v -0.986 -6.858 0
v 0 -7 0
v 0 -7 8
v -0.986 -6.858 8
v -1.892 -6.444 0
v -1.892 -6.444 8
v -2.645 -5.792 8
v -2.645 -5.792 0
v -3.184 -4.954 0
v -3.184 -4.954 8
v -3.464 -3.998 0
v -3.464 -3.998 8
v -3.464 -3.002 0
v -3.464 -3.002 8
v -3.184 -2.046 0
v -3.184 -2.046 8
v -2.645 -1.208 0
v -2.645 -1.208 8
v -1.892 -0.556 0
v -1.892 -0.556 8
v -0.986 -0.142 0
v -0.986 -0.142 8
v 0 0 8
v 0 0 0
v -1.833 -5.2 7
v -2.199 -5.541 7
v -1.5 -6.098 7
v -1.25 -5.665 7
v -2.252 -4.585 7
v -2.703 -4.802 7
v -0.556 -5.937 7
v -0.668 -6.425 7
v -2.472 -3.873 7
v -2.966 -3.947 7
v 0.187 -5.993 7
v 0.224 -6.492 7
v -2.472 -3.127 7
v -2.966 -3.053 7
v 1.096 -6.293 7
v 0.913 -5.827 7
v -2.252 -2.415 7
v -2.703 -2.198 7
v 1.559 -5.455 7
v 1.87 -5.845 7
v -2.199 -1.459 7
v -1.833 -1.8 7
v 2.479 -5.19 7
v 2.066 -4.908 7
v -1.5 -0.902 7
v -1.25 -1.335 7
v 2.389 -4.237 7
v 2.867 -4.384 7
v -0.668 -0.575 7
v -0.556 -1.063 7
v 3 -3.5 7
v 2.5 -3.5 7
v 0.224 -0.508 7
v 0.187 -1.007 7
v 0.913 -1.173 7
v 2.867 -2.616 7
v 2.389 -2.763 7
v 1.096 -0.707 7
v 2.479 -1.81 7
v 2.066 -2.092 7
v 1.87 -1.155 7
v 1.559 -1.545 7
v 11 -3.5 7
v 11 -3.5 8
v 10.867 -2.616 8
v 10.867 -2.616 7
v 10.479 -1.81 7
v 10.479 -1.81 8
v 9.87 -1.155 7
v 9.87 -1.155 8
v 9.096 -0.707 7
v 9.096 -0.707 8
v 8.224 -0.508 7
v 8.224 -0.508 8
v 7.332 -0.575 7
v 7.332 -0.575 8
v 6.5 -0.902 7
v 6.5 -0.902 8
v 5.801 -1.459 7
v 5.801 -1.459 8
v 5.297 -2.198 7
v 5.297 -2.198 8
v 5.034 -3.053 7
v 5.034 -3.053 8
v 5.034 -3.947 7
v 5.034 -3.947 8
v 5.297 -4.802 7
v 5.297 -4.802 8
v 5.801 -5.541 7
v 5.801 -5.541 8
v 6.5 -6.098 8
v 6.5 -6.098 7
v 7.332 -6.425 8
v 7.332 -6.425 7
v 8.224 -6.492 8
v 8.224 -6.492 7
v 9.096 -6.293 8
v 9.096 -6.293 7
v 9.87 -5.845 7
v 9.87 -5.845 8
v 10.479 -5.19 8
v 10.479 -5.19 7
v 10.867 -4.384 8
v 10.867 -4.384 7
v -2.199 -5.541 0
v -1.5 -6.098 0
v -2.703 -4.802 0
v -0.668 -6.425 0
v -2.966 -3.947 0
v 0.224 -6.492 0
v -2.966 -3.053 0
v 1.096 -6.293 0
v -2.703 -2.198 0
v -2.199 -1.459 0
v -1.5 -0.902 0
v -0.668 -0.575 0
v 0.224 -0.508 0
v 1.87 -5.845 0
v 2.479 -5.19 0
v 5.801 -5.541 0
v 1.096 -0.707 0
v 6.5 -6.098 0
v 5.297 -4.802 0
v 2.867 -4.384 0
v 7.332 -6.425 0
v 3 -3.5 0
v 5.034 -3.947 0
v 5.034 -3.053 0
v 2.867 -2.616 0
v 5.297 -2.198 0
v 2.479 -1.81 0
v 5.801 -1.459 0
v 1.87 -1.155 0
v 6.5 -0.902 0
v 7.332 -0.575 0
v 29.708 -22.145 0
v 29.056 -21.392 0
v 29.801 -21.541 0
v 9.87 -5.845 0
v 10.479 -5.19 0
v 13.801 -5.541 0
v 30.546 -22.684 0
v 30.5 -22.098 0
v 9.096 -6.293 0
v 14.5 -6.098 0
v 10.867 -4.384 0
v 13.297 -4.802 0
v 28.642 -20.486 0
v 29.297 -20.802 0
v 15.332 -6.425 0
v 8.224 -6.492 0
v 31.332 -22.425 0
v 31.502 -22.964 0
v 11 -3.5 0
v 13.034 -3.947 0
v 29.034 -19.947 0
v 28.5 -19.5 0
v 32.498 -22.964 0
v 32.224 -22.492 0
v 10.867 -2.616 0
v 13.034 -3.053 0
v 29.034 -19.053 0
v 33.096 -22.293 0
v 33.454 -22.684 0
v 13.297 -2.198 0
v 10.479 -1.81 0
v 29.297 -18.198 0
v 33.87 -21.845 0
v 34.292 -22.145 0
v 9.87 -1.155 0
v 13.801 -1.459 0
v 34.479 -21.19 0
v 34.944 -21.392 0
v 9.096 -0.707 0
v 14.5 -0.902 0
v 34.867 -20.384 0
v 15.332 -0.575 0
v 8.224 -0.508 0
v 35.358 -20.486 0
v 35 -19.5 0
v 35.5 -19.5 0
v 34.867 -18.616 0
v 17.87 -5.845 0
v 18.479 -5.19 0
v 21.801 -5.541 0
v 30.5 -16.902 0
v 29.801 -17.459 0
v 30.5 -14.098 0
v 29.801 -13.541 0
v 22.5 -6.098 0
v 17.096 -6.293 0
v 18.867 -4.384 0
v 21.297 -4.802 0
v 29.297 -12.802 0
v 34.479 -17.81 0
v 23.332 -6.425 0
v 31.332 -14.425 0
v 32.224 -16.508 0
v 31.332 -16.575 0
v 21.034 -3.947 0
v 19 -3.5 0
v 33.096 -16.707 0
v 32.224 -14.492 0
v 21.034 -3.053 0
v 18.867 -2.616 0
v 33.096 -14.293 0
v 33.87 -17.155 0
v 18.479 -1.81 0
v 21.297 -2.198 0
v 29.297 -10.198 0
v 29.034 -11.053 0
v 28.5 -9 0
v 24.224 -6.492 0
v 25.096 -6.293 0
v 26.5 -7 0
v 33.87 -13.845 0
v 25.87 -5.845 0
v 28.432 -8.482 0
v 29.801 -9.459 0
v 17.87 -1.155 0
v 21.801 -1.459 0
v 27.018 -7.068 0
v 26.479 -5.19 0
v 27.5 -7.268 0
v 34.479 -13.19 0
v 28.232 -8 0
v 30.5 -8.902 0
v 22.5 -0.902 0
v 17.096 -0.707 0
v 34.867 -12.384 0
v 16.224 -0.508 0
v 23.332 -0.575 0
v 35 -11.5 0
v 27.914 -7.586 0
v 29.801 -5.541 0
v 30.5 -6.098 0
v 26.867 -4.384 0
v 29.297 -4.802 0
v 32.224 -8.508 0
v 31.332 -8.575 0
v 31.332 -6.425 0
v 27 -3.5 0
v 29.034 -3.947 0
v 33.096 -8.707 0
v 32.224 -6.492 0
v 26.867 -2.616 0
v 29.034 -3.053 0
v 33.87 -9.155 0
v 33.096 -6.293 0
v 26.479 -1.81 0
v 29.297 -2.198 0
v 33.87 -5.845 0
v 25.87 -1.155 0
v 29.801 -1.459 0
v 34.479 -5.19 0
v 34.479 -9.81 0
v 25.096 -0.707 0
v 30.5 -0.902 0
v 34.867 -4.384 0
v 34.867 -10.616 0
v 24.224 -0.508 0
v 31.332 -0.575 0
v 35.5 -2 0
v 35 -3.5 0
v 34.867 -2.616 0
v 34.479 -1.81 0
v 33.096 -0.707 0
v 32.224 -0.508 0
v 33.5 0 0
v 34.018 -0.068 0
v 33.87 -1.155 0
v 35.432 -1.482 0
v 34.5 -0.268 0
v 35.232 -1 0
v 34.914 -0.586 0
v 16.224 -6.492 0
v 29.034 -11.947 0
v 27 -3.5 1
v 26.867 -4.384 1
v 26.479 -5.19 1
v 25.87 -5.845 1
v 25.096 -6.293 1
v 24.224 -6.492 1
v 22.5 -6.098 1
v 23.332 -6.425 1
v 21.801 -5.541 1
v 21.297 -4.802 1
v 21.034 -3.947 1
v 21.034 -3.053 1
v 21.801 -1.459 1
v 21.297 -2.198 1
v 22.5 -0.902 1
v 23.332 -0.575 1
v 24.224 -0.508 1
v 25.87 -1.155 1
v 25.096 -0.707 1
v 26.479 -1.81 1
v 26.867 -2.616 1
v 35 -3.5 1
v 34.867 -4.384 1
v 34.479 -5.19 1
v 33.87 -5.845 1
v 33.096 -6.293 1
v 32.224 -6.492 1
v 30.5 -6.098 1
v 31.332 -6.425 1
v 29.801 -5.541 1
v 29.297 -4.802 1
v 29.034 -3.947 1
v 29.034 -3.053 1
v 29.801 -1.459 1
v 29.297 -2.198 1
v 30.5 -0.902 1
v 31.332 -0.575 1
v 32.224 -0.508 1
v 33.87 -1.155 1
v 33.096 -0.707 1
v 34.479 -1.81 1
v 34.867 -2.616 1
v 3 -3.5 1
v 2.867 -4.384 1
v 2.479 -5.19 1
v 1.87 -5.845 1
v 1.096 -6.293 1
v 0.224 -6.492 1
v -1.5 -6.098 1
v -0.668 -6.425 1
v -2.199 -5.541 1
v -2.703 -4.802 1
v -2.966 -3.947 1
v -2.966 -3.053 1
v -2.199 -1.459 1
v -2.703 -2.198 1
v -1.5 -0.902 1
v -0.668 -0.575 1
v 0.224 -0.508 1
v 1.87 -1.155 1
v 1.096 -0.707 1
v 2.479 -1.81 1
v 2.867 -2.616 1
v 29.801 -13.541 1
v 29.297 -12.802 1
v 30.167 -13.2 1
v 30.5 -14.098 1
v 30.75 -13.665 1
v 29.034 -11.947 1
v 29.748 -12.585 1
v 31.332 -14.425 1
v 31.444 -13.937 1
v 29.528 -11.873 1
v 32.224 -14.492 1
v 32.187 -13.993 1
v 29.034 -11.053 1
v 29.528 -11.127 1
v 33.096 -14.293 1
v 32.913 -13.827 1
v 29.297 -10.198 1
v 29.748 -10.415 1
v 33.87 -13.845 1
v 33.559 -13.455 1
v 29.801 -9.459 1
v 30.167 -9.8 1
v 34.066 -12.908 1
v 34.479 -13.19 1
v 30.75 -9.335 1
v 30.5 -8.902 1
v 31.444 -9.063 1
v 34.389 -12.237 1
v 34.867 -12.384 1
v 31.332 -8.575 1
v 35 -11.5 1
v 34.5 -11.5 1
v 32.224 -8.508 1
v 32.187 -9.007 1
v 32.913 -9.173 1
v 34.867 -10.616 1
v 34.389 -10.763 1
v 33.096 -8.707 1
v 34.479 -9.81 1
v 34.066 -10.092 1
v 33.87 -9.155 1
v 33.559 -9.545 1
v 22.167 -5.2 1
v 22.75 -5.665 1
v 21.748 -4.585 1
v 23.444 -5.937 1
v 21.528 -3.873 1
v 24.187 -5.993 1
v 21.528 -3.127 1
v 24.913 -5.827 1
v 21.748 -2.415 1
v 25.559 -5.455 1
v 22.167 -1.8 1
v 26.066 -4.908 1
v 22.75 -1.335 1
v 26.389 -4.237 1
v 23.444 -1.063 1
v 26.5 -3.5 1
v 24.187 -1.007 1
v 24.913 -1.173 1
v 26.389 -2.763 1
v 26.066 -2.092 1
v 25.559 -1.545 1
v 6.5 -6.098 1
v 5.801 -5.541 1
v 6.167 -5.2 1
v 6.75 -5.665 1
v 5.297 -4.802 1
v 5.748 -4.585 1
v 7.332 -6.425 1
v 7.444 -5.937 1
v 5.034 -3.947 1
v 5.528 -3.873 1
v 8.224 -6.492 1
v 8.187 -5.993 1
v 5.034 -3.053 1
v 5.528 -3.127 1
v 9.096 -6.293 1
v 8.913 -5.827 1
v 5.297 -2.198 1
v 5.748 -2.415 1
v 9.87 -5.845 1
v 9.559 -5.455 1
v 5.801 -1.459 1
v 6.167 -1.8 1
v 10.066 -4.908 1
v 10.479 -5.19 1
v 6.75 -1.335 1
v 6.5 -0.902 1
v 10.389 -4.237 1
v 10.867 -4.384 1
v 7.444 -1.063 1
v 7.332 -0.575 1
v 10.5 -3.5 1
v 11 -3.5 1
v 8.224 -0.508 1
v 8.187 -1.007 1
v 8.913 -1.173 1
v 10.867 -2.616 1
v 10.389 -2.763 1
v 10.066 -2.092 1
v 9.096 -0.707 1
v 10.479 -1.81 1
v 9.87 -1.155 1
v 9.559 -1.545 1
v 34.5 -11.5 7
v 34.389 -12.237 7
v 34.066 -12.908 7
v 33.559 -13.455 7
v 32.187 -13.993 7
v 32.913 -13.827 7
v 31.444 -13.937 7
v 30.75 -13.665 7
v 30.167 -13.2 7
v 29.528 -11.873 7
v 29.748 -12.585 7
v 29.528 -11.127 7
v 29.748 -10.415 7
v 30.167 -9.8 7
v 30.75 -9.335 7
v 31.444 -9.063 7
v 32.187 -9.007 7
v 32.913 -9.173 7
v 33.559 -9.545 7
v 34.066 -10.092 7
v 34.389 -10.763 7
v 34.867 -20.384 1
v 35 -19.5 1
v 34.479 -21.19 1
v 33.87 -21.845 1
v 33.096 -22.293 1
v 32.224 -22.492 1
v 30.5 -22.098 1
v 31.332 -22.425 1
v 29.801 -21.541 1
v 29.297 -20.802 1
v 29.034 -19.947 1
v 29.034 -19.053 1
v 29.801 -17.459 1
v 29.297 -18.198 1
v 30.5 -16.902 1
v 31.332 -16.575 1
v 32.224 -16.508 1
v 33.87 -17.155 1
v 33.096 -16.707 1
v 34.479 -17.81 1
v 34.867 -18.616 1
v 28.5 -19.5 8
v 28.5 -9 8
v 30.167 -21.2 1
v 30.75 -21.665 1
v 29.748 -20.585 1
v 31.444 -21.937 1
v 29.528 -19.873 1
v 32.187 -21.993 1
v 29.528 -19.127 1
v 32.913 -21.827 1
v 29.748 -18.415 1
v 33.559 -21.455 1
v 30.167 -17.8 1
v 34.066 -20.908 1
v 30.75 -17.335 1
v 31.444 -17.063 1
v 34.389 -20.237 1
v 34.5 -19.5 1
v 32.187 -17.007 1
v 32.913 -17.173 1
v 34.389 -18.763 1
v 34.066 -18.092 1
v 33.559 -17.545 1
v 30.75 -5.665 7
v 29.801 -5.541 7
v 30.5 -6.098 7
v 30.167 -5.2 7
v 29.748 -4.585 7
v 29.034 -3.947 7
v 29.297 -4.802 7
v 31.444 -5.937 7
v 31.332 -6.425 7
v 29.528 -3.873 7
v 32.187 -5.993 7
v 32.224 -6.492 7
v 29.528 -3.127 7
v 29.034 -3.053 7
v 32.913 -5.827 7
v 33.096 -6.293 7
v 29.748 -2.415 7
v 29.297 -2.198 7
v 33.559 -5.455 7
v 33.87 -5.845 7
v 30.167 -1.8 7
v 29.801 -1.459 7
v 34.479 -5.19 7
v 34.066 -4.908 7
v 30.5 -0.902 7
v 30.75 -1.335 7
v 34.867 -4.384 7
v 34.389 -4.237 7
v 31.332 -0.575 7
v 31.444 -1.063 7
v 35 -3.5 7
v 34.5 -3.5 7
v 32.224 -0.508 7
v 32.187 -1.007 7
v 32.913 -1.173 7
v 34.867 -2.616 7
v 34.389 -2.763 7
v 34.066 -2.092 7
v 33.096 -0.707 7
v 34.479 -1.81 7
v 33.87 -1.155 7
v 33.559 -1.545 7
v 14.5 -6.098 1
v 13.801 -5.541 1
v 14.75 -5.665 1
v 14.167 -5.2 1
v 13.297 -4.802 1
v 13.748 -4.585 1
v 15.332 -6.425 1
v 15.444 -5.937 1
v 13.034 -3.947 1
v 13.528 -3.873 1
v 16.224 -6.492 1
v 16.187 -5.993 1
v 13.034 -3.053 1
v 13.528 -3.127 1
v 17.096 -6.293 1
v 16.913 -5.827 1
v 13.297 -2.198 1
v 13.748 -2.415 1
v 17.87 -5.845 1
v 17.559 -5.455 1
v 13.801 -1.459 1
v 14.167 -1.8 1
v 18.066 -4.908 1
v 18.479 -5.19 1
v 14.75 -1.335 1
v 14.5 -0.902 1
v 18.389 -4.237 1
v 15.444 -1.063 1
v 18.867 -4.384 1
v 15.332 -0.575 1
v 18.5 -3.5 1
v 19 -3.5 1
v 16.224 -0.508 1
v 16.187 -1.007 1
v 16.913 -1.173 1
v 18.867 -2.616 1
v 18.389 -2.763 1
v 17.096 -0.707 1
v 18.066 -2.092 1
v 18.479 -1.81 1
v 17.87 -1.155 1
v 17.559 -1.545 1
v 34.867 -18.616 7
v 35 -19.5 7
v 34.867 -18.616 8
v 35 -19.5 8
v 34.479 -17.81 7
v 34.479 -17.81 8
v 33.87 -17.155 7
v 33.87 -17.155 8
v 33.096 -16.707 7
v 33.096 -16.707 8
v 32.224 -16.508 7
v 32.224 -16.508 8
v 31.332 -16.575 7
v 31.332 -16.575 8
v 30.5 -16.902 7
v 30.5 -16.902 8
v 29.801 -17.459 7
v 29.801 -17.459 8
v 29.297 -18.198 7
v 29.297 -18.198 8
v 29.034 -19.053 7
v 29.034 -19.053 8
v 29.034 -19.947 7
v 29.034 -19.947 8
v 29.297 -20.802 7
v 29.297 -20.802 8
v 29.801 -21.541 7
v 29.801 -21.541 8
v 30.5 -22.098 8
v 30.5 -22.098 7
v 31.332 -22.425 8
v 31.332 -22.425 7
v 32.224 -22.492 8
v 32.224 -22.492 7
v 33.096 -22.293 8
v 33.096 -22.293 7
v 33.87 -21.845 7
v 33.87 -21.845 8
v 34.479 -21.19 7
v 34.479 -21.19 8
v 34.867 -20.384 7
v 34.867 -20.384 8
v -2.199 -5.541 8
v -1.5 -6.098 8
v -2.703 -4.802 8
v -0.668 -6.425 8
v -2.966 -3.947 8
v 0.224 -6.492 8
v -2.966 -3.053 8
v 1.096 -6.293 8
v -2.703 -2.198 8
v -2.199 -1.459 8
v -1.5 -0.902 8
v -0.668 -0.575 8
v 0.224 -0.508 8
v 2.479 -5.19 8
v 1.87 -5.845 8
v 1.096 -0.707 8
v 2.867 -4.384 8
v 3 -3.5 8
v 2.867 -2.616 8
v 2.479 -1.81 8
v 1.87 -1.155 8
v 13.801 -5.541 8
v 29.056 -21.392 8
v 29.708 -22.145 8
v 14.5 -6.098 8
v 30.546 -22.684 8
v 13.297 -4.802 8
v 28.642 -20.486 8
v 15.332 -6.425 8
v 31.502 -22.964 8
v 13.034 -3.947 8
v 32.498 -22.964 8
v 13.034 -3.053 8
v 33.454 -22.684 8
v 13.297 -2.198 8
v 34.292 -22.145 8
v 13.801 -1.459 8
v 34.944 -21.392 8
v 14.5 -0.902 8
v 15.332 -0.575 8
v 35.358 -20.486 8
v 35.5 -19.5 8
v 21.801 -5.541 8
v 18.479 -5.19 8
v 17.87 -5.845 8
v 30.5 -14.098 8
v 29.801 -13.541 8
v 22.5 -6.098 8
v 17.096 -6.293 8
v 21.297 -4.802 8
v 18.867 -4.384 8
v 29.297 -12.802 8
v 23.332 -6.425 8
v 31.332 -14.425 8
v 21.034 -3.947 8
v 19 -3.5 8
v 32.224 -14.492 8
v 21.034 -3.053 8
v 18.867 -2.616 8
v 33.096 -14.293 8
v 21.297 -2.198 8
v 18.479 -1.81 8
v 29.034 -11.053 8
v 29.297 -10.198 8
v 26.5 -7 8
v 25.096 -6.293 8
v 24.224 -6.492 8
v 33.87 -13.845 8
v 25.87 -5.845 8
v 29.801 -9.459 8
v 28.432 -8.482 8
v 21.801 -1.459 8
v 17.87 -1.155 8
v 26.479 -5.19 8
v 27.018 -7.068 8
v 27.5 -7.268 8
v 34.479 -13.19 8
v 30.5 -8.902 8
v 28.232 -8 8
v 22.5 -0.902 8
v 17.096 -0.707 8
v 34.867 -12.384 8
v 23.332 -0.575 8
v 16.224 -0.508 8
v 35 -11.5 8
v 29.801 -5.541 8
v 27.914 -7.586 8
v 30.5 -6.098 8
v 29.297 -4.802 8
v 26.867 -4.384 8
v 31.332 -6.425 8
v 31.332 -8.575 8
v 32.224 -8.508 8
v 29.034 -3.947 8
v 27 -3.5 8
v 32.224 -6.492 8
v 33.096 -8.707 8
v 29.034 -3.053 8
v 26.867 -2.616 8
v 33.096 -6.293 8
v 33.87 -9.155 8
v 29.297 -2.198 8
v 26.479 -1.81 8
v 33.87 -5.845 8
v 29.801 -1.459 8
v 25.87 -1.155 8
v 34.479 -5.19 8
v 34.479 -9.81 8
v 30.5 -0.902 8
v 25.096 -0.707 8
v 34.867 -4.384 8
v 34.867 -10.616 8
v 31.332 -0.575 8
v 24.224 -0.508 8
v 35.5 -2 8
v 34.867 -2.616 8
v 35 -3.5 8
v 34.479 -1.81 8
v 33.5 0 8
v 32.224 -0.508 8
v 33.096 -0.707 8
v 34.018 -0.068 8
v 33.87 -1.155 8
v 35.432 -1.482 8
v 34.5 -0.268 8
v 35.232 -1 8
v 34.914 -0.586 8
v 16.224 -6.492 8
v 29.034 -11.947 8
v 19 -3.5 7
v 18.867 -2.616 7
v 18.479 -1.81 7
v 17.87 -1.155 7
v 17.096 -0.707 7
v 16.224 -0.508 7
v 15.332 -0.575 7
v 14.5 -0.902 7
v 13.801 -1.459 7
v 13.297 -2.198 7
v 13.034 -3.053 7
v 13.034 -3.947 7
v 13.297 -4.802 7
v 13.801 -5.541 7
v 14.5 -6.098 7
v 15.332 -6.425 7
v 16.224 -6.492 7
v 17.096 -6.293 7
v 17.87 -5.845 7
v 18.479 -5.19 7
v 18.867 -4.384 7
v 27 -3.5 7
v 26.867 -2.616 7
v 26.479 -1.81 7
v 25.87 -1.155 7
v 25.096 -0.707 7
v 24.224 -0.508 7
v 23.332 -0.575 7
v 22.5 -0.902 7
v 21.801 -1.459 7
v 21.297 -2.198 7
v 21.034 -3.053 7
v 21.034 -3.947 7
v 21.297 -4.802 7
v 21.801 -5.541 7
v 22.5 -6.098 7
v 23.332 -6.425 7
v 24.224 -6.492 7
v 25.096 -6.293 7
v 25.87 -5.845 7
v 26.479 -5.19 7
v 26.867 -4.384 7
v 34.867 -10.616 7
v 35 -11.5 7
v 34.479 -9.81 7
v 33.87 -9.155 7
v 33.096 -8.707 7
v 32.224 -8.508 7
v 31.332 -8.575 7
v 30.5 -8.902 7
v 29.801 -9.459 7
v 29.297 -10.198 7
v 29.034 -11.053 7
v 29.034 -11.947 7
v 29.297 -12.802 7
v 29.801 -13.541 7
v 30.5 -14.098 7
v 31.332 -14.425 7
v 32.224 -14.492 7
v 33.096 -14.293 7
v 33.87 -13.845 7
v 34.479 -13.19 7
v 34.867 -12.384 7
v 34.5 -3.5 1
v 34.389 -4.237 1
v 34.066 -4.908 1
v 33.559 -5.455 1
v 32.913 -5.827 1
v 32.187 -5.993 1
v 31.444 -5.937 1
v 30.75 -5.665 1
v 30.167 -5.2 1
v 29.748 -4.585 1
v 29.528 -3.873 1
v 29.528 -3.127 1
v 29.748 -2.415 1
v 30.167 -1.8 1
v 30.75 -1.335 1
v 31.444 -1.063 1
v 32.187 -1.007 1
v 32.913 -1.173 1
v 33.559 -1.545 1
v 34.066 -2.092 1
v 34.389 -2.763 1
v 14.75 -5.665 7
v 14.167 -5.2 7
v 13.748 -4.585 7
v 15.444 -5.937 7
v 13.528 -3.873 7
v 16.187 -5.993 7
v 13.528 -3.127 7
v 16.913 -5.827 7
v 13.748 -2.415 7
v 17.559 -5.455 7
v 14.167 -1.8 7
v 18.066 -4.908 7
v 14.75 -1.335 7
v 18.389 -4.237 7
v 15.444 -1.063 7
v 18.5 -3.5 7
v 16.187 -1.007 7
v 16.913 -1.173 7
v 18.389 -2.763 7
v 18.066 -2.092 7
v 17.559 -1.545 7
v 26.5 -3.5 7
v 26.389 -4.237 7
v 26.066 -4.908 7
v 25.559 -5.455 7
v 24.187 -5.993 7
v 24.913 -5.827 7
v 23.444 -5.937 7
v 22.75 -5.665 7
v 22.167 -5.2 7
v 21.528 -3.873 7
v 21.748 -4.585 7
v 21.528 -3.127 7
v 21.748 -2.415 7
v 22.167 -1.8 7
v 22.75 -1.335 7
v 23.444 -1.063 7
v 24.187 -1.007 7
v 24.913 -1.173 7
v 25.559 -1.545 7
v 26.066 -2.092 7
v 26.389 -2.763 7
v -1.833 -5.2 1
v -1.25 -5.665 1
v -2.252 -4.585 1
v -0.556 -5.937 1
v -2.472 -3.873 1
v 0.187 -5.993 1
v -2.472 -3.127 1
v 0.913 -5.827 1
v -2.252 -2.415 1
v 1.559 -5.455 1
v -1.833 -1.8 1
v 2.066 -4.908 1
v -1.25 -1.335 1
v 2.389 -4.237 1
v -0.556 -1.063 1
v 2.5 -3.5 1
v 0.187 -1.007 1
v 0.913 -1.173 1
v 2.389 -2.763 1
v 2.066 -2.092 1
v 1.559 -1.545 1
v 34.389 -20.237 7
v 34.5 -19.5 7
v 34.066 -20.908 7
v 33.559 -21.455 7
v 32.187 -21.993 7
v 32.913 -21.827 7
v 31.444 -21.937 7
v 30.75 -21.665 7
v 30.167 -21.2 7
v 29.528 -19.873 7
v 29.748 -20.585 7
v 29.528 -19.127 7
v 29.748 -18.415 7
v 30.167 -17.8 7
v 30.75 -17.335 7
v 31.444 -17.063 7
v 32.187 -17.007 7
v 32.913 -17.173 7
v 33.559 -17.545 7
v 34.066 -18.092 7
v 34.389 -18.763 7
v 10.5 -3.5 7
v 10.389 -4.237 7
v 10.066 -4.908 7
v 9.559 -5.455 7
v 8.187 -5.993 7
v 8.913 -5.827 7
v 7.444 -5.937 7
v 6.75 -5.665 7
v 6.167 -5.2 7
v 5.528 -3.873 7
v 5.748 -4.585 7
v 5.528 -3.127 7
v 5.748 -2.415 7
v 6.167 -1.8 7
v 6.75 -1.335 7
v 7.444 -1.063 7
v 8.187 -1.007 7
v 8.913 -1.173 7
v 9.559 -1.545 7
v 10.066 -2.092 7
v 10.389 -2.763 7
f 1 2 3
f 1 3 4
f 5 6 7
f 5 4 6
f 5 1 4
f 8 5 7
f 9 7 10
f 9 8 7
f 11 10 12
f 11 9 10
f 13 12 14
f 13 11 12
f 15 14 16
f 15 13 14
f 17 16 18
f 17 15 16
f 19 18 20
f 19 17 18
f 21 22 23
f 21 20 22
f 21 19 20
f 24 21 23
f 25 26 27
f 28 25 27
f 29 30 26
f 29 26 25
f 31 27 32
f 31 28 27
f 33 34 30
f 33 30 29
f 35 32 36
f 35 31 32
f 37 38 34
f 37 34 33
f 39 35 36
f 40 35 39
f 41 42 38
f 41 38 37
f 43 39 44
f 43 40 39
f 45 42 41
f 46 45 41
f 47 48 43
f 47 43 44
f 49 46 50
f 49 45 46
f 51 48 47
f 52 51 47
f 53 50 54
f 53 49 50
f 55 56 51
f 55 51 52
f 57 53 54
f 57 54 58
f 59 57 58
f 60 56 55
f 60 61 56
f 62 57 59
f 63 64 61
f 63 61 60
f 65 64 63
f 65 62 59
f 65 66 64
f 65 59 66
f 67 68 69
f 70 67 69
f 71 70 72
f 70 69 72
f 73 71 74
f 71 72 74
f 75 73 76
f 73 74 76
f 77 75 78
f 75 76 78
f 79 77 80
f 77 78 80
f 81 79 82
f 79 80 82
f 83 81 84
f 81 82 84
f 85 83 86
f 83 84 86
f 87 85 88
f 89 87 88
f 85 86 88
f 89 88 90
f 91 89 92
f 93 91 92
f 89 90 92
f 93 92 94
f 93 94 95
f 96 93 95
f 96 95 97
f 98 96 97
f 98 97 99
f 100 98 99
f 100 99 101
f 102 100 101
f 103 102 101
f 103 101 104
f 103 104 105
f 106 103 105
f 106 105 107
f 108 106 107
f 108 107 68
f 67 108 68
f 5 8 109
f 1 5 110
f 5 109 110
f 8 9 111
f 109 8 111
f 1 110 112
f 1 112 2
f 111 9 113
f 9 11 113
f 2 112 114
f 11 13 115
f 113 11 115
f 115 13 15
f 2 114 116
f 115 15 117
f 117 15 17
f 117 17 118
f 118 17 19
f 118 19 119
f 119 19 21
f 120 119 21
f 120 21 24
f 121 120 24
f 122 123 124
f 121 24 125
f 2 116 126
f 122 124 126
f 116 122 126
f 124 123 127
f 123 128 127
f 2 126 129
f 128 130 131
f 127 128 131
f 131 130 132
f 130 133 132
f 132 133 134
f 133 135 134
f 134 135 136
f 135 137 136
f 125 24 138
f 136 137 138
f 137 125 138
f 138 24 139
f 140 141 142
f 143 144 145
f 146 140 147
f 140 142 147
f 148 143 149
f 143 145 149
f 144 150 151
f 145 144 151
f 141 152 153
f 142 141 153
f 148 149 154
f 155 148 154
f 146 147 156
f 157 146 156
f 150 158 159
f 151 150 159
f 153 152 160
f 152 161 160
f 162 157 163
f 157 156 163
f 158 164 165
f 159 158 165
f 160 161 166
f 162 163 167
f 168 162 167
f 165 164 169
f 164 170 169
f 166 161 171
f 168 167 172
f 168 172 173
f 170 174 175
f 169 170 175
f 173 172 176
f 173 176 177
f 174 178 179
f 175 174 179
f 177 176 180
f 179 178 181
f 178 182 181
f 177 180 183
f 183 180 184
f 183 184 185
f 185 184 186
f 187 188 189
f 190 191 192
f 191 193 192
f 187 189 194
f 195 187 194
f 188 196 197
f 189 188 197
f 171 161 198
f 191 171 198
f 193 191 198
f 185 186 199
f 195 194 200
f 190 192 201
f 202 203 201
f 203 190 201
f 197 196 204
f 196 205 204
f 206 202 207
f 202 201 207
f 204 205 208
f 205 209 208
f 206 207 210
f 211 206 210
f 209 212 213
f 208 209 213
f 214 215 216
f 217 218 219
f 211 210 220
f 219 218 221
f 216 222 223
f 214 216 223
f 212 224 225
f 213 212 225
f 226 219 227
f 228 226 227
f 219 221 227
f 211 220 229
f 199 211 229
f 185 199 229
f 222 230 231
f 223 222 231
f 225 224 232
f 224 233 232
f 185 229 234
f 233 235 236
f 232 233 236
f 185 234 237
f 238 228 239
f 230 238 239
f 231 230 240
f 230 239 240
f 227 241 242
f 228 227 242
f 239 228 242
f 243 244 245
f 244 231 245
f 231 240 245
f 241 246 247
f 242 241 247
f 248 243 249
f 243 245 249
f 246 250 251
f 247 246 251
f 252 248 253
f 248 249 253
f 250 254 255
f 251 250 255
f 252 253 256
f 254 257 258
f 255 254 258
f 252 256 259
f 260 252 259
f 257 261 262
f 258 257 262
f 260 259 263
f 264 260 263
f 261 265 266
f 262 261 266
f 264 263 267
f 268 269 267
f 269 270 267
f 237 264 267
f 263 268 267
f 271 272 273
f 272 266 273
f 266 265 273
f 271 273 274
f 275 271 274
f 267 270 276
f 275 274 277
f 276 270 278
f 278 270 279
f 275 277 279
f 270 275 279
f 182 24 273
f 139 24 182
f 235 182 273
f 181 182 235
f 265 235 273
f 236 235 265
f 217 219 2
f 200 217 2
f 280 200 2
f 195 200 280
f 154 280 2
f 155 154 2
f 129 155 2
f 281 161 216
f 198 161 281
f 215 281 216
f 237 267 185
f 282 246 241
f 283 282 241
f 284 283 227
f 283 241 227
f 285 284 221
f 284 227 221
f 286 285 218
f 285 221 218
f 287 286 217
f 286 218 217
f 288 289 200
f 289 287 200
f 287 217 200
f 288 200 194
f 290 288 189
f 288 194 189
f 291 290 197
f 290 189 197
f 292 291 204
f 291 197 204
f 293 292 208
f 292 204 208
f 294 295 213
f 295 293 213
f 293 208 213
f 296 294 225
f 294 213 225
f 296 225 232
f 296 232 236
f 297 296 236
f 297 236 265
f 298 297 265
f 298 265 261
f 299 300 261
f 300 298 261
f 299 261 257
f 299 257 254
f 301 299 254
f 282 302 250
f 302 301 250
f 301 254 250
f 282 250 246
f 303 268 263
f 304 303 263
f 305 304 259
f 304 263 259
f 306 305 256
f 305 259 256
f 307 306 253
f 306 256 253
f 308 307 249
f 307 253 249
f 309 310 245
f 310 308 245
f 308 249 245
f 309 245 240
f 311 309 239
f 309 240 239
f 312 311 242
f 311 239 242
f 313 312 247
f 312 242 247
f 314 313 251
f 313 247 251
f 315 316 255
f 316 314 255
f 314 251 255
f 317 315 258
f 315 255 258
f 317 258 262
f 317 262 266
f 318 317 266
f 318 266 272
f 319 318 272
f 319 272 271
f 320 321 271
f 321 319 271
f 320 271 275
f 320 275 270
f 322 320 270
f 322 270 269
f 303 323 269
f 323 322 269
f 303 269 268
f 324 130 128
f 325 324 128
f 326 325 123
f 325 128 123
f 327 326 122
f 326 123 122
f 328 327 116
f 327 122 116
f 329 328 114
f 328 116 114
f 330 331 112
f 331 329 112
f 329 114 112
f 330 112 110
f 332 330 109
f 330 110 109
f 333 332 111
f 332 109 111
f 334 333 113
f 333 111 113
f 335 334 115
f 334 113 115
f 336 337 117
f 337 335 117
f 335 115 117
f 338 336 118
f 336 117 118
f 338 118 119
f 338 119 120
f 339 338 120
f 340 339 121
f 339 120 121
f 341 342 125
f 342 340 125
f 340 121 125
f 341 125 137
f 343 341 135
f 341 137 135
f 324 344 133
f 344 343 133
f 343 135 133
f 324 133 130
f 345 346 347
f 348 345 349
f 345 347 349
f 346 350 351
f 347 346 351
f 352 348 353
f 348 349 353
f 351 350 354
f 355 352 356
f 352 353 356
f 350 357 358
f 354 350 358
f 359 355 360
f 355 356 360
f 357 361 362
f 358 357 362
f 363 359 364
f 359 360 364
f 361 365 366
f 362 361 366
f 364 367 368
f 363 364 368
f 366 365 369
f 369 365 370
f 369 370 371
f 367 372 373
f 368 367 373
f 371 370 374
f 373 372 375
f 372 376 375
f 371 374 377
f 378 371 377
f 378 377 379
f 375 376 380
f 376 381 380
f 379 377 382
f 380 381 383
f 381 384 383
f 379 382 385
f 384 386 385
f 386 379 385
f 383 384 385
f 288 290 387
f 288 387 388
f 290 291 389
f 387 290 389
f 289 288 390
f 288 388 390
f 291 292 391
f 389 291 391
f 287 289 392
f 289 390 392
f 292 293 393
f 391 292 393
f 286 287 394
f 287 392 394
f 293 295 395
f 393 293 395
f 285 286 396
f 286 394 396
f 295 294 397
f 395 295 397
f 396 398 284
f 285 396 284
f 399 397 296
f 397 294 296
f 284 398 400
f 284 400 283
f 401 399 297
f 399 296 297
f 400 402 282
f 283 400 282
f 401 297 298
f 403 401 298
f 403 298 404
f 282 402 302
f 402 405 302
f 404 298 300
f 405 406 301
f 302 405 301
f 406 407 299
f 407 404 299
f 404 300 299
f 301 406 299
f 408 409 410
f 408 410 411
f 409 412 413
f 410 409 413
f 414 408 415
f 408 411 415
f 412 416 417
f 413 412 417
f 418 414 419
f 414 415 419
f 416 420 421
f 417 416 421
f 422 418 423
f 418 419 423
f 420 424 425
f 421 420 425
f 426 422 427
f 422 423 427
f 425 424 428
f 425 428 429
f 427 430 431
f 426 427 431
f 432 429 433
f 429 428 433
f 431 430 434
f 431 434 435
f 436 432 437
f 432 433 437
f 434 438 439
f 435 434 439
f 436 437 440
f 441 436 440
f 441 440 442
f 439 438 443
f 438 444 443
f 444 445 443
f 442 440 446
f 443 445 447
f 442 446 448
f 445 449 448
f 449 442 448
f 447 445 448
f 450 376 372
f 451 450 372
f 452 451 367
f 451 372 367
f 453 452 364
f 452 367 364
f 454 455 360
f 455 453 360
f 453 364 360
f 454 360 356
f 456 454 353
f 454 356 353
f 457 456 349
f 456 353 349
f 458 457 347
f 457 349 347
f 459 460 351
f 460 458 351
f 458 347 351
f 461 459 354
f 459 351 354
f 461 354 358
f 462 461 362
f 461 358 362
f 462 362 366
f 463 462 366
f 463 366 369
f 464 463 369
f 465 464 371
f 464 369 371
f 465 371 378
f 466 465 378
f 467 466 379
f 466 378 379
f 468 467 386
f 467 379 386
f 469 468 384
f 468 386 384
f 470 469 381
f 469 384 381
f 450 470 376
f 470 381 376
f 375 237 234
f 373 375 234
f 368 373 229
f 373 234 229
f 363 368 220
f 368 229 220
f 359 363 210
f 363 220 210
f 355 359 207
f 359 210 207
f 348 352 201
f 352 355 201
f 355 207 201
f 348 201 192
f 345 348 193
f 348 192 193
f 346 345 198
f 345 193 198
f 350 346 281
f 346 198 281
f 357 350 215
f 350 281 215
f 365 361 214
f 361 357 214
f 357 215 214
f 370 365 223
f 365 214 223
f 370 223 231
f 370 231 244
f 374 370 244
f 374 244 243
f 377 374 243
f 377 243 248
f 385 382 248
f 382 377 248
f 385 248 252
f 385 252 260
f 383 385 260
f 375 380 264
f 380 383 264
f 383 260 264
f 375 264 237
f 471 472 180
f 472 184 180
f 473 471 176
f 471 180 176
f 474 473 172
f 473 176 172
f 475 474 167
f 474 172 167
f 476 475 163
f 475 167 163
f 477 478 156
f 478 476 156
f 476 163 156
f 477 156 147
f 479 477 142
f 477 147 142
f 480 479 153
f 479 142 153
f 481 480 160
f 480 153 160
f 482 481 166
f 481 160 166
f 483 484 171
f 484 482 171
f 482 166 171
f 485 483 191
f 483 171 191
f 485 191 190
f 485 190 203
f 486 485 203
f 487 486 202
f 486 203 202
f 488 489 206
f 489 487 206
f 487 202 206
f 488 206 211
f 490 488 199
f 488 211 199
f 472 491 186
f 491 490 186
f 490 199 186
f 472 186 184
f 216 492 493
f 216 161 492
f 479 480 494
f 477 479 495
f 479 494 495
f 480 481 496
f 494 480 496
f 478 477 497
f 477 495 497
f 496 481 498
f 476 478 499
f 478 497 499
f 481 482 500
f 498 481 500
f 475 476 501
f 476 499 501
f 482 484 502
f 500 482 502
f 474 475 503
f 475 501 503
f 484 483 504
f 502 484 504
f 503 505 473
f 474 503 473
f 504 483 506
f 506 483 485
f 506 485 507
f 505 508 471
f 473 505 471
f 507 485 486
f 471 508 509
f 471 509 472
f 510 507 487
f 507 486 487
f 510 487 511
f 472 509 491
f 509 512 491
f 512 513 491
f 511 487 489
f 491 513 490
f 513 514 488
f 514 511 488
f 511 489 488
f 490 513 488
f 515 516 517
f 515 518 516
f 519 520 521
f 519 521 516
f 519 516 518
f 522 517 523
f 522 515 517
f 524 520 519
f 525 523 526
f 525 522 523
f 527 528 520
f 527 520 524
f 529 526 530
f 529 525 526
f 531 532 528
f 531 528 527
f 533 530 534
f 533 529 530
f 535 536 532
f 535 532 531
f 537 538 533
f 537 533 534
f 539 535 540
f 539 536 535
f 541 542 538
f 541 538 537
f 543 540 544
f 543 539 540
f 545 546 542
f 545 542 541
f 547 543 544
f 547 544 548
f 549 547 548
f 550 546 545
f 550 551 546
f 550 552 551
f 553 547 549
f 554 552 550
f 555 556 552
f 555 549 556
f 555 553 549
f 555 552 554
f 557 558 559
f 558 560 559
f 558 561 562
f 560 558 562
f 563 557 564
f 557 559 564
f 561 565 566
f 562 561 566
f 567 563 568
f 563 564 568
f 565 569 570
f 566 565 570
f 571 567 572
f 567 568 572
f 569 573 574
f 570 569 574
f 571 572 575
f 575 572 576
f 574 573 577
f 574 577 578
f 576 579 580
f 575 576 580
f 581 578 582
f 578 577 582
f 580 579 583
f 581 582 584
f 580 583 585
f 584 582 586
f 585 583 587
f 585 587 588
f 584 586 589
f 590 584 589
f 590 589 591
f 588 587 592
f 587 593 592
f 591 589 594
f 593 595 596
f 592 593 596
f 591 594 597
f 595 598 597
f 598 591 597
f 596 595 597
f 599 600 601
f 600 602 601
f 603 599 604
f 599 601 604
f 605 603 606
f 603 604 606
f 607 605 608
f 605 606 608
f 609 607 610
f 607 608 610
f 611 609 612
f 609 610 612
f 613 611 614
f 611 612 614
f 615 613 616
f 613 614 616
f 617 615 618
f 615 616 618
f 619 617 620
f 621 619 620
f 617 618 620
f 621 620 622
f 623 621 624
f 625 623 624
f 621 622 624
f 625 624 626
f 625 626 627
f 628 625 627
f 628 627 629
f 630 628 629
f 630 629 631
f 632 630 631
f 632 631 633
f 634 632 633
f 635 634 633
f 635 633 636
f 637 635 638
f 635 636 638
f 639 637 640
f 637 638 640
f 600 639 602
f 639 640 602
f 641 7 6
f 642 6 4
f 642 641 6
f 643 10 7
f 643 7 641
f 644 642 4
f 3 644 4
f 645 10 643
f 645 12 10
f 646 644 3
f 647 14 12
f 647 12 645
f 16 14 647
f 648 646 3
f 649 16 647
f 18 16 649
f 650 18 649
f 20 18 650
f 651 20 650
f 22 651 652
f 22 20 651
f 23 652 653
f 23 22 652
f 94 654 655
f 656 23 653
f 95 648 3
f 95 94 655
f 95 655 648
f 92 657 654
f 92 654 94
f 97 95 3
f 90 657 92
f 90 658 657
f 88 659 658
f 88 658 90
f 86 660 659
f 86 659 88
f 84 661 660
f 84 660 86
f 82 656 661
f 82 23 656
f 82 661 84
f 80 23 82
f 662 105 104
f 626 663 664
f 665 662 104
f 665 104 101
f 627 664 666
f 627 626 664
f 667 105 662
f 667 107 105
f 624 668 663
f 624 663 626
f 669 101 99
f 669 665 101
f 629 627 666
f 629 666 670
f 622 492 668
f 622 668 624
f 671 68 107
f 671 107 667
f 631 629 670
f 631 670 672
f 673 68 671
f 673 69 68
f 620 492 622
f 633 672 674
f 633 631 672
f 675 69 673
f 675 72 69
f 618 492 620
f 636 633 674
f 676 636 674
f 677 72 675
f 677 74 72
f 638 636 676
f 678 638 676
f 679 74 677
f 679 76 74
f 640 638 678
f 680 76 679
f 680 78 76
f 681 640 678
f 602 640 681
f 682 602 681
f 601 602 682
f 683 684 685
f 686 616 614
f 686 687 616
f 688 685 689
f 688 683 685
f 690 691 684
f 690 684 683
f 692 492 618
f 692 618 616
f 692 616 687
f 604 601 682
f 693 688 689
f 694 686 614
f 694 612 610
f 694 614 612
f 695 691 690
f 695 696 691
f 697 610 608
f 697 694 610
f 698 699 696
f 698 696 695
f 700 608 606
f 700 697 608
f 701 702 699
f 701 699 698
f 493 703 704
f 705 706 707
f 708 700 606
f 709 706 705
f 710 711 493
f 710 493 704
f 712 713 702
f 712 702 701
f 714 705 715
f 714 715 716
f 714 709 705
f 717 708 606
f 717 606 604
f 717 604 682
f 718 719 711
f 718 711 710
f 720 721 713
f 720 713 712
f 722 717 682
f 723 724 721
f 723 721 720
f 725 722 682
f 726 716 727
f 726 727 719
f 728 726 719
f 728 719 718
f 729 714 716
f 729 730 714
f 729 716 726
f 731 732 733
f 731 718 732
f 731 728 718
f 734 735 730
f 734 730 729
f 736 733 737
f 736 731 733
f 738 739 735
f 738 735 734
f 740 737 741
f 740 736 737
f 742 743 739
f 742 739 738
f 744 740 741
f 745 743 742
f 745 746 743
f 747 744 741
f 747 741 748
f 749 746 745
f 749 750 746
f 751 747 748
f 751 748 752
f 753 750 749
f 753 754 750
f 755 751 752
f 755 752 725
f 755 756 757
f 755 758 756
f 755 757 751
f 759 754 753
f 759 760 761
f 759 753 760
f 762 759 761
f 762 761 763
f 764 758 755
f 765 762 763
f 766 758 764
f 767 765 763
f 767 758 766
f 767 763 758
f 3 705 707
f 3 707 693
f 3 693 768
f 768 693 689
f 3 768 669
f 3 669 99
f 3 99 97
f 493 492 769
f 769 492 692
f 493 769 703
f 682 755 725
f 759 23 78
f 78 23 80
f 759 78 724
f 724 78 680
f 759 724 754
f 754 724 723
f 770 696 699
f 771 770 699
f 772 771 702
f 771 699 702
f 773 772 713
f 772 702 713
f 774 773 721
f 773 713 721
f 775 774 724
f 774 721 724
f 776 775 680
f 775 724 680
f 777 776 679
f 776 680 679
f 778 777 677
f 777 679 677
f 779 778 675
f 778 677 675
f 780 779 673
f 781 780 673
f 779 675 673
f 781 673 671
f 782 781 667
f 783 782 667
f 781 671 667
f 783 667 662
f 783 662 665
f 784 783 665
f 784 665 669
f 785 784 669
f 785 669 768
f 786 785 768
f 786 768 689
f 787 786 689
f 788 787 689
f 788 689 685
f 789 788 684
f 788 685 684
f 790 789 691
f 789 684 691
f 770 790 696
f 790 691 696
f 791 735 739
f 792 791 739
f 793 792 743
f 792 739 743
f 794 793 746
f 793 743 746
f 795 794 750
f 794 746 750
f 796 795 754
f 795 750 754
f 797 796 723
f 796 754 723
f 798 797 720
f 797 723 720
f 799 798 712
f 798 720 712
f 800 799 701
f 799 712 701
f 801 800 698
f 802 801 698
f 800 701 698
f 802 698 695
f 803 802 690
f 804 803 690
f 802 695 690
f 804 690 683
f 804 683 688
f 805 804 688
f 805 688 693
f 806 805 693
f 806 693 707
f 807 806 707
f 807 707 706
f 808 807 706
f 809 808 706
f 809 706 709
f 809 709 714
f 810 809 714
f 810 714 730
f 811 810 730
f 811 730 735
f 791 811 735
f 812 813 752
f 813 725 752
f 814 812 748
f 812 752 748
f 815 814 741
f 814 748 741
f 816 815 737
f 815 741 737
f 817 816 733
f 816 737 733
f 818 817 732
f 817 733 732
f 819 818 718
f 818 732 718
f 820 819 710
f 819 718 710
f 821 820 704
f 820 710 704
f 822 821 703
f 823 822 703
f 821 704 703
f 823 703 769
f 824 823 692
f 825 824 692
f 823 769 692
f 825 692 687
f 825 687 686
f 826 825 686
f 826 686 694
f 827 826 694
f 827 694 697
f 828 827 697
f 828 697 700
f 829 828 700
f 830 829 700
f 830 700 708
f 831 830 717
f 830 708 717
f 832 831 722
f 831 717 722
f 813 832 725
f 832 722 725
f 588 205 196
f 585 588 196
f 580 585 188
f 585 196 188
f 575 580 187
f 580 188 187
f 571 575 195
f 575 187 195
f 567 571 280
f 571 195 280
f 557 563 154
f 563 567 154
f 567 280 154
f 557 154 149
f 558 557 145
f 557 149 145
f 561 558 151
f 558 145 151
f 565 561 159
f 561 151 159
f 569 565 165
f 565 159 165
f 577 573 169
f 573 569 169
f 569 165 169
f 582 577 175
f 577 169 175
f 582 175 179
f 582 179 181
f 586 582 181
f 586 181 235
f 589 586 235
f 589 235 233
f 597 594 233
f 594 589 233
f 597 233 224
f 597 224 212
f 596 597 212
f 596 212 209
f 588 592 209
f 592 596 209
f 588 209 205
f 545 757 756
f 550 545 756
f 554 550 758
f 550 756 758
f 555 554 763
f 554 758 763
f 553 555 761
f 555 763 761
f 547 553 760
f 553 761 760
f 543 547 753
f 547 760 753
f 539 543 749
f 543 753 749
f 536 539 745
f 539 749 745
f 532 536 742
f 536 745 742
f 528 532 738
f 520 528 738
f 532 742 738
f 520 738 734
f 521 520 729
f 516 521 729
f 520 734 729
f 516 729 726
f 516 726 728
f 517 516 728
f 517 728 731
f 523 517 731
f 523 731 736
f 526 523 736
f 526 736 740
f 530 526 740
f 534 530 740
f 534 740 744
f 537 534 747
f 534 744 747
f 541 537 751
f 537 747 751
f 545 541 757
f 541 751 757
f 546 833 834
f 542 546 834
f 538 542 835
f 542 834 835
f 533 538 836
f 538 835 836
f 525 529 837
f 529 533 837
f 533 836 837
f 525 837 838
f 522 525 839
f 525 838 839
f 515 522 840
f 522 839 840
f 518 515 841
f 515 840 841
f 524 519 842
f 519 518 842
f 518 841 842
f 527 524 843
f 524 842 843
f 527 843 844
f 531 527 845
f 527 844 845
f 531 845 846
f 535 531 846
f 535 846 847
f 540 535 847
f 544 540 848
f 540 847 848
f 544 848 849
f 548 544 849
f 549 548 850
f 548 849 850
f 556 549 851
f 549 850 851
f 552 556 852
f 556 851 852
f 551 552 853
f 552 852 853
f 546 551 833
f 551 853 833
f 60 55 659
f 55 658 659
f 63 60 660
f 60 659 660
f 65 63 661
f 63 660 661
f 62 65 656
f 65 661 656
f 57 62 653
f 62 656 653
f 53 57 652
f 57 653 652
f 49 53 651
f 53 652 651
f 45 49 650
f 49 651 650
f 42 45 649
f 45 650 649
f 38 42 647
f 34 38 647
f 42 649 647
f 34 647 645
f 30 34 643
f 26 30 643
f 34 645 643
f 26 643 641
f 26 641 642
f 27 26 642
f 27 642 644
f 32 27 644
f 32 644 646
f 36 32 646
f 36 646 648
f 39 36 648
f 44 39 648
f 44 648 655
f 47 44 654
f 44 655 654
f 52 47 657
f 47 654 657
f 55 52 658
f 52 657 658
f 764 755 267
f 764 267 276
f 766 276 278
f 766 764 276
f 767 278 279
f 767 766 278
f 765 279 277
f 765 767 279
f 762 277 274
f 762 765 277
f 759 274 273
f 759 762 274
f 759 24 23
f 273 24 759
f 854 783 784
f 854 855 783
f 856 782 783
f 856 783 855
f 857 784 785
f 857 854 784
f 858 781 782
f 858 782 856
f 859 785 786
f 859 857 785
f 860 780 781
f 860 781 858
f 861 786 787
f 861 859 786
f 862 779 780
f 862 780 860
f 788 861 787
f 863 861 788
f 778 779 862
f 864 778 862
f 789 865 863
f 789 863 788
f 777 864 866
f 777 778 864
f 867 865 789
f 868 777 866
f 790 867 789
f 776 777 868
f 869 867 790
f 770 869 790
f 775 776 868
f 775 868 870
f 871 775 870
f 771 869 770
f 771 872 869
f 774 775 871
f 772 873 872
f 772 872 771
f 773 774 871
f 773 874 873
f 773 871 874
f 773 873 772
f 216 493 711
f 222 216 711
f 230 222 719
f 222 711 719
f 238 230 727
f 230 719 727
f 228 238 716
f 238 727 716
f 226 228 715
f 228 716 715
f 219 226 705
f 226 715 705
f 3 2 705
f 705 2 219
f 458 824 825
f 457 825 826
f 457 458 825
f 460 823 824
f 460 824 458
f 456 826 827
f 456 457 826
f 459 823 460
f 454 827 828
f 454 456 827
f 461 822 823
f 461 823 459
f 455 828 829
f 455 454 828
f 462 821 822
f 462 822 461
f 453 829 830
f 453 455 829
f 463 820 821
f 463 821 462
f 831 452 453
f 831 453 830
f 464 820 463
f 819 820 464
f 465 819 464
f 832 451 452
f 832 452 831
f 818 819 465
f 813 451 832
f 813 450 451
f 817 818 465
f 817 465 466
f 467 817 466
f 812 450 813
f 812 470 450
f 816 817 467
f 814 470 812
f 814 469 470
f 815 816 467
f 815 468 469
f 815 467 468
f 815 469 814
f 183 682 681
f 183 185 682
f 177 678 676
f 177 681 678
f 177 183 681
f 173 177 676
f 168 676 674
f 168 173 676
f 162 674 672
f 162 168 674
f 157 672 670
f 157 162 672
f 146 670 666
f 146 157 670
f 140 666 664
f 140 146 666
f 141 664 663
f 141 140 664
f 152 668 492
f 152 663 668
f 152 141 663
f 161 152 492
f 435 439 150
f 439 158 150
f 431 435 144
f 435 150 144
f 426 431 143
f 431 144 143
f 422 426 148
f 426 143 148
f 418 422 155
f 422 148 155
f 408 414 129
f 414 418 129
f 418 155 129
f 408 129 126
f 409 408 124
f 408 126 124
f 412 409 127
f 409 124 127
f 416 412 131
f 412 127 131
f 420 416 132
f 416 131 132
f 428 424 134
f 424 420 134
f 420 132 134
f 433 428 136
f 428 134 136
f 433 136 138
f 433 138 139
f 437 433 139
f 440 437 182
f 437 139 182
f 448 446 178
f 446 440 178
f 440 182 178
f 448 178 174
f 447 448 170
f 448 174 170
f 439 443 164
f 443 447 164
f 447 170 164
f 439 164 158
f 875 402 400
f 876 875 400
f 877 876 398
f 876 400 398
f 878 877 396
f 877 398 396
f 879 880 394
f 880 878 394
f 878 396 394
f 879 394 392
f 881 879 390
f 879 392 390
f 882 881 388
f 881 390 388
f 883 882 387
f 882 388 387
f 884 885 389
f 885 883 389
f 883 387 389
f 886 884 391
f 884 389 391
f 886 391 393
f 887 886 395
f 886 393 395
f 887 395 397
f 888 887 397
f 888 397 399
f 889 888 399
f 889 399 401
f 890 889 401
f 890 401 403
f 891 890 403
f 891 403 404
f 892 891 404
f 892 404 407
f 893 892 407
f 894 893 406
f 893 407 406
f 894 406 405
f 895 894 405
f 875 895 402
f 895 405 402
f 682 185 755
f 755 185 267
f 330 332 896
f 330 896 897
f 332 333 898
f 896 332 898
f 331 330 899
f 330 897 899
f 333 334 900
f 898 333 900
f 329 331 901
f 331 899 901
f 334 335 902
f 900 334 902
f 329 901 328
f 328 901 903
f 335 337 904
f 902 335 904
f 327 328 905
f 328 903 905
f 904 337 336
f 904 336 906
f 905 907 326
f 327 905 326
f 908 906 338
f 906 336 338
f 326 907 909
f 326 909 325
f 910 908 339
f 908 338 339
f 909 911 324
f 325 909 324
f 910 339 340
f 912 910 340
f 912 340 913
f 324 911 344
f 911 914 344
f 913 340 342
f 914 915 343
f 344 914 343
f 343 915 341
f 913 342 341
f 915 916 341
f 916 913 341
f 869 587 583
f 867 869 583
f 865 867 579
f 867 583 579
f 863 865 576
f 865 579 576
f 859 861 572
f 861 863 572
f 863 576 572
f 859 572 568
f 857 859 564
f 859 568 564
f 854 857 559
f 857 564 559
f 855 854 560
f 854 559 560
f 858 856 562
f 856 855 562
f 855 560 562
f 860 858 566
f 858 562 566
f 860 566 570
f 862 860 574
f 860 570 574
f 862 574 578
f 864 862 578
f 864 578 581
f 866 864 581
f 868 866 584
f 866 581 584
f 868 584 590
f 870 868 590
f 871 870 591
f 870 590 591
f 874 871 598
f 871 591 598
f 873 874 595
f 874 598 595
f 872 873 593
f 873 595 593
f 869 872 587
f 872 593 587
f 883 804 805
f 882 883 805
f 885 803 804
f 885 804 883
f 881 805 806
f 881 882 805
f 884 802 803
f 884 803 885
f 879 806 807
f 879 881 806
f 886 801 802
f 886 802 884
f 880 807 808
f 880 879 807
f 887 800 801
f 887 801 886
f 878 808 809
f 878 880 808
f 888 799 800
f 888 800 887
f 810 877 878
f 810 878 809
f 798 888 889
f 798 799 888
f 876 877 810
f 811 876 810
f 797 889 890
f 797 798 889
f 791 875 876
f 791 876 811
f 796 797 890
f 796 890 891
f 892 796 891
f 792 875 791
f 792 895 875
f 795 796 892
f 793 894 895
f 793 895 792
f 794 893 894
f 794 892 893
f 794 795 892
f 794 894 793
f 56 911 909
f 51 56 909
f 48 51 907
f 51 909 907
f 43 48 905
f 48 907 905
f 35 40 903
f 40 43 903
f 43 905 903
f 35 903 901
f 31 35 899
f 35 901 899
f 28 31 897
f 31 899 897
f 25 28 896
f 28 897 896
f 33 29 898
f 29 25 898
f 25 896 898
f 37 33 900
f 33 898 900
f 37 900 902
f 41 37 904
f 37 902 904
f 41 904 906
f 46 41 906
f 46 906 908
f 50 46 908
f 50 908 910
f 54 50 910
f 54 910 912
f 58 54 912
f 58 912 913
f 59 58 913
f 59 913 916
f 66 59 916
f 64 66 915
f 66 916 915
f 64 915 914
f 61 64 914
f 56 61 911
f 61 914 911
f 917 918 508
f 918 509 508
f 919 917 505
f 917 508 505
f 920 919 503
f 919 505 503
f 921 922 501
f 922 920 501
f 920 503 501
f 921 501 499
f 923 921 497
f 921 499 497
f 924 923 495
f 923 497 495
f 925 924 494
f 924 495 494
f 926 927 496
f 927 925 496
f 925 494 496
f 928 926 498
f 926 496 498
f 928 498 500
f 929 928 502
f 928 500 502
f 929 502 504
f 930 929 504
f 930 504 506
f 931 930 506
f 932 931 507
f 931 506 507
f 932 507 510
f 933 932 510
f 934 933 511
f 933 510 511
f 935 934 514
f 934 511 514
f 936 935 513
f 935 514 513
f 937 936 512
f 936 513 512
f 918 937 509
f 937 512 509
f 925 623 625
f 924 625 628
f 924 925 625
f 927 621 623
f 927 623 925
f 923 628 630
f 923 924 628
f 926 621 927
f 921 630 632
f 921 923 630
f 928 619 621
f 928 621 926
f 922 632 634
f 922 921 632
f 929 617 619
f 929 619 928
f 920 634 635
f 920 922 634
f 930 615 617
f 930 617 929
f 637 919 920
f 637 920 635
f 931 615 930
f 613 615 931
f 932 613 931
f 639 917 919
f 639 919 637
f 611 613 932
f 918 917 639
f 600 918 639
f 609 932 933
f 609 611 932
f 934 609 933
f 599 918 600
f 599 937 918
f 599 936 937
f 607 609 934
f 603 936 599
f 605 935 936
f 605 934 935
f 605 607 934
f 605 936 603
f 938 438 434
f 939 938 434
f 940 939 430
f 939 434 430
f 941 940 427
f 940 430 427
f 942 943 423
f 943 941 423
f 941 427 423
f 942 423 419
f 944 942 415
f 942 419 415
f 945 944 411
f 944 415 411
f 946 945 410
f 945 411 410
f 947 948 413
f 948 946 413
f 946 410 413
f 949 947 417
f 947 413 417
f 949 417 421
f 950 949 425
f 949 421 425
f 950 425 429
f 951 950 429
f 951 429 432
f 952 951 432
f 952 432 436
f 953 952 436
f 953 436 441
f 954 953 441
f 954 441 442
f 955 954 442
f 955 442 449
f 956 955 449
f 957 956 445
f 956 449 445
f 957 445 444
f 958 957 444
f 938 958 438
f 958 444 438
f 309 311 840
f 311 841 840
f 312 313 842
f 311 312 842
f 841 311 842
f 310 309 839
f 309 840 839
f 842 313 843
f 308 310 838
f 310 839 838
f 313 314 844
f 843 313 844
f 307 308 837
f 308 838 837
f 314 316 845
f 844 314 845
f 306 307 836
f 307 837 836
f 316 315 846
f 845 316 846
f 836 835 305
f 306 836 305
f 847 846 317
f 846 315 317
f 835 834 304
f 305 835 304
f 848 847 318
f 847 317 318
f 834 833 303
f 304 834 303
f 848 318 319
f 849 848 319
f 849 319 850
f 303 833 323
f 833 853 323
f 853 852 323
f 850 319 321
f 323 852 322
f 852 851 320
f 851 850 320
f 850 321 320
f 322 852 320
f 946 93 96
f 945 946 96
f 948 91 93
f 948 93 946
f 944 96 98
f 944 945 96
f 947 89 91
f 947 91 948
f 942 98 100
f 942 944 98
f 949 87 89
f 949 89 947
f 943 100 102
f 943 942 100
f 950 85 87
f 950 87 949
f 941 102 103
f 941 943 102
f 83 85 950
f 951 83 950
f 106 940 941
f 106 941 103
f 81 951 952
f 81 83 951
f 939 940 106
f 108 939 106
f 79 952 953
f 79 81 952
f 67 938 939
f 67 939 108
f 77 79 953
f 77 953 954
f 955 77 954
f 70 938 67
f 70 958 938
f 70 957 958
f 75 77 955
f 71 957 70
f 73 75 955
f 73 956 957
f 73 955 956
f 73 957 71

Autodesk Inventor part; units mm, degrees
ref_plane "YZ Plane" through (0, 0, 0) normal (1, 0, 0) x (0, 1, 0)
ref_plane "XZ Plane" through (0, 0, 0) normal (0, 1, 0) x (-1, 0, 0)
ref_plane "XY Plane" through (0, 0, 0) normal (0, 0, 1) x (1, 0, 0)
sketch "Sketch1" plane through (0, 0, 0) normal (0, 0, 1) x (1, 0, 0)
  arc A0 (0, 0) -> (0, -7) centre (0, -3.5) ccw
  circle A1 centre (0, -3.5) radius 2.5
  circle A2 centre (0, -3.5) radius 3
  circle A3 centre (32, -3.5) radius 2.5
  circle A4 centre (32, -3.5) radius 3
  circle A5 centre (8, -3.5) radius 2.5
  circle A6 centre (8, -3.5) radius 3
  circle A7 centre (16, -3.5) radius 3
  circle A8 centre (16, -3.5) radius 2.5
  circle A9 centre (24, -3.5) radius 3
  circle A10 centre (24, -3.5) radius 2.5
  circle A11 centre (32, -19.5) radius 3
  circle A12 centre (32, -19.5) radius 2.5
  line L0 (28.5, -19.5) -> (28.5, -7)
  line L1 (35.5, -19.5) -> (35.5, -7)
  circle A13 centre (32, -11.5) radius 2.5
  circle A14 centre (32, -11.5) radius 3
  arc A15 (28.5, -19.5) -> (35.5, -19.5) centre (32, -19.5) ccw
  line L2 (35.5, -7) -> (35.5, 0)
  line L3 (0, -7) -> (28.5, -7)
  line L4 (0, 0) -> (35.5, 0)
extrude "Extrusion1" add sketch "Sketch1" along normal blind 8 contours L4 L2 L1 A15 L0 L3 A0 | A2 | A4 | A6 | A7 | A9 | A11 | A14
extrude "Extrusion2" cut sketch "Sketch1" along normal blind 1 contours A2 | A4 | A6 | A7 | A9 | A11 | A14
sketch "Sketch2" plane through (0, 0, 8) normal (0, 0, 1) x (1, 0, 0)
  circle A0 centre (32, -11.5) radius 2.5 projected
  circle A1 centre (32, -19.5) radius 2.5 projected
  circle A2 centre (24, -3.5) radius 2.5 projected
  circle A3 centre (16, -3.5) radius 2.5 projected
  circle A4 centre (8, -3.5) radius 2.5 projected
  circle A5 centre (32, -3.5) radius 2.5 projected
  circle A6 centre (0, -3.5) radius 2.5 projected
  circle A7 centre (0, -3.5) radius 3 projected
  circle A8 centre (8, -3.5) radius 3 projected
  circle A9 centre (16, -3.5) radius 3 projected
  circle A10 centre (24, -3.5) radius 3 projected
  circle A11 centre (32, -3.5) radius 3 projected
  circle A12 centre (32, -11.5) radius 3 projected
  circle A13 centre (32, -19.5) radius 3 projected
extrude "Extrusion3" cut sketch "Sketch2" against normal blind 1
fillet "Fillet1" radius 2 1 edges at (35.5, 0, 4)
fillet "Fillet2" radius 2 1 edges at (28.5, -7, 4)
properties part number "technic L 5 barrenos"
